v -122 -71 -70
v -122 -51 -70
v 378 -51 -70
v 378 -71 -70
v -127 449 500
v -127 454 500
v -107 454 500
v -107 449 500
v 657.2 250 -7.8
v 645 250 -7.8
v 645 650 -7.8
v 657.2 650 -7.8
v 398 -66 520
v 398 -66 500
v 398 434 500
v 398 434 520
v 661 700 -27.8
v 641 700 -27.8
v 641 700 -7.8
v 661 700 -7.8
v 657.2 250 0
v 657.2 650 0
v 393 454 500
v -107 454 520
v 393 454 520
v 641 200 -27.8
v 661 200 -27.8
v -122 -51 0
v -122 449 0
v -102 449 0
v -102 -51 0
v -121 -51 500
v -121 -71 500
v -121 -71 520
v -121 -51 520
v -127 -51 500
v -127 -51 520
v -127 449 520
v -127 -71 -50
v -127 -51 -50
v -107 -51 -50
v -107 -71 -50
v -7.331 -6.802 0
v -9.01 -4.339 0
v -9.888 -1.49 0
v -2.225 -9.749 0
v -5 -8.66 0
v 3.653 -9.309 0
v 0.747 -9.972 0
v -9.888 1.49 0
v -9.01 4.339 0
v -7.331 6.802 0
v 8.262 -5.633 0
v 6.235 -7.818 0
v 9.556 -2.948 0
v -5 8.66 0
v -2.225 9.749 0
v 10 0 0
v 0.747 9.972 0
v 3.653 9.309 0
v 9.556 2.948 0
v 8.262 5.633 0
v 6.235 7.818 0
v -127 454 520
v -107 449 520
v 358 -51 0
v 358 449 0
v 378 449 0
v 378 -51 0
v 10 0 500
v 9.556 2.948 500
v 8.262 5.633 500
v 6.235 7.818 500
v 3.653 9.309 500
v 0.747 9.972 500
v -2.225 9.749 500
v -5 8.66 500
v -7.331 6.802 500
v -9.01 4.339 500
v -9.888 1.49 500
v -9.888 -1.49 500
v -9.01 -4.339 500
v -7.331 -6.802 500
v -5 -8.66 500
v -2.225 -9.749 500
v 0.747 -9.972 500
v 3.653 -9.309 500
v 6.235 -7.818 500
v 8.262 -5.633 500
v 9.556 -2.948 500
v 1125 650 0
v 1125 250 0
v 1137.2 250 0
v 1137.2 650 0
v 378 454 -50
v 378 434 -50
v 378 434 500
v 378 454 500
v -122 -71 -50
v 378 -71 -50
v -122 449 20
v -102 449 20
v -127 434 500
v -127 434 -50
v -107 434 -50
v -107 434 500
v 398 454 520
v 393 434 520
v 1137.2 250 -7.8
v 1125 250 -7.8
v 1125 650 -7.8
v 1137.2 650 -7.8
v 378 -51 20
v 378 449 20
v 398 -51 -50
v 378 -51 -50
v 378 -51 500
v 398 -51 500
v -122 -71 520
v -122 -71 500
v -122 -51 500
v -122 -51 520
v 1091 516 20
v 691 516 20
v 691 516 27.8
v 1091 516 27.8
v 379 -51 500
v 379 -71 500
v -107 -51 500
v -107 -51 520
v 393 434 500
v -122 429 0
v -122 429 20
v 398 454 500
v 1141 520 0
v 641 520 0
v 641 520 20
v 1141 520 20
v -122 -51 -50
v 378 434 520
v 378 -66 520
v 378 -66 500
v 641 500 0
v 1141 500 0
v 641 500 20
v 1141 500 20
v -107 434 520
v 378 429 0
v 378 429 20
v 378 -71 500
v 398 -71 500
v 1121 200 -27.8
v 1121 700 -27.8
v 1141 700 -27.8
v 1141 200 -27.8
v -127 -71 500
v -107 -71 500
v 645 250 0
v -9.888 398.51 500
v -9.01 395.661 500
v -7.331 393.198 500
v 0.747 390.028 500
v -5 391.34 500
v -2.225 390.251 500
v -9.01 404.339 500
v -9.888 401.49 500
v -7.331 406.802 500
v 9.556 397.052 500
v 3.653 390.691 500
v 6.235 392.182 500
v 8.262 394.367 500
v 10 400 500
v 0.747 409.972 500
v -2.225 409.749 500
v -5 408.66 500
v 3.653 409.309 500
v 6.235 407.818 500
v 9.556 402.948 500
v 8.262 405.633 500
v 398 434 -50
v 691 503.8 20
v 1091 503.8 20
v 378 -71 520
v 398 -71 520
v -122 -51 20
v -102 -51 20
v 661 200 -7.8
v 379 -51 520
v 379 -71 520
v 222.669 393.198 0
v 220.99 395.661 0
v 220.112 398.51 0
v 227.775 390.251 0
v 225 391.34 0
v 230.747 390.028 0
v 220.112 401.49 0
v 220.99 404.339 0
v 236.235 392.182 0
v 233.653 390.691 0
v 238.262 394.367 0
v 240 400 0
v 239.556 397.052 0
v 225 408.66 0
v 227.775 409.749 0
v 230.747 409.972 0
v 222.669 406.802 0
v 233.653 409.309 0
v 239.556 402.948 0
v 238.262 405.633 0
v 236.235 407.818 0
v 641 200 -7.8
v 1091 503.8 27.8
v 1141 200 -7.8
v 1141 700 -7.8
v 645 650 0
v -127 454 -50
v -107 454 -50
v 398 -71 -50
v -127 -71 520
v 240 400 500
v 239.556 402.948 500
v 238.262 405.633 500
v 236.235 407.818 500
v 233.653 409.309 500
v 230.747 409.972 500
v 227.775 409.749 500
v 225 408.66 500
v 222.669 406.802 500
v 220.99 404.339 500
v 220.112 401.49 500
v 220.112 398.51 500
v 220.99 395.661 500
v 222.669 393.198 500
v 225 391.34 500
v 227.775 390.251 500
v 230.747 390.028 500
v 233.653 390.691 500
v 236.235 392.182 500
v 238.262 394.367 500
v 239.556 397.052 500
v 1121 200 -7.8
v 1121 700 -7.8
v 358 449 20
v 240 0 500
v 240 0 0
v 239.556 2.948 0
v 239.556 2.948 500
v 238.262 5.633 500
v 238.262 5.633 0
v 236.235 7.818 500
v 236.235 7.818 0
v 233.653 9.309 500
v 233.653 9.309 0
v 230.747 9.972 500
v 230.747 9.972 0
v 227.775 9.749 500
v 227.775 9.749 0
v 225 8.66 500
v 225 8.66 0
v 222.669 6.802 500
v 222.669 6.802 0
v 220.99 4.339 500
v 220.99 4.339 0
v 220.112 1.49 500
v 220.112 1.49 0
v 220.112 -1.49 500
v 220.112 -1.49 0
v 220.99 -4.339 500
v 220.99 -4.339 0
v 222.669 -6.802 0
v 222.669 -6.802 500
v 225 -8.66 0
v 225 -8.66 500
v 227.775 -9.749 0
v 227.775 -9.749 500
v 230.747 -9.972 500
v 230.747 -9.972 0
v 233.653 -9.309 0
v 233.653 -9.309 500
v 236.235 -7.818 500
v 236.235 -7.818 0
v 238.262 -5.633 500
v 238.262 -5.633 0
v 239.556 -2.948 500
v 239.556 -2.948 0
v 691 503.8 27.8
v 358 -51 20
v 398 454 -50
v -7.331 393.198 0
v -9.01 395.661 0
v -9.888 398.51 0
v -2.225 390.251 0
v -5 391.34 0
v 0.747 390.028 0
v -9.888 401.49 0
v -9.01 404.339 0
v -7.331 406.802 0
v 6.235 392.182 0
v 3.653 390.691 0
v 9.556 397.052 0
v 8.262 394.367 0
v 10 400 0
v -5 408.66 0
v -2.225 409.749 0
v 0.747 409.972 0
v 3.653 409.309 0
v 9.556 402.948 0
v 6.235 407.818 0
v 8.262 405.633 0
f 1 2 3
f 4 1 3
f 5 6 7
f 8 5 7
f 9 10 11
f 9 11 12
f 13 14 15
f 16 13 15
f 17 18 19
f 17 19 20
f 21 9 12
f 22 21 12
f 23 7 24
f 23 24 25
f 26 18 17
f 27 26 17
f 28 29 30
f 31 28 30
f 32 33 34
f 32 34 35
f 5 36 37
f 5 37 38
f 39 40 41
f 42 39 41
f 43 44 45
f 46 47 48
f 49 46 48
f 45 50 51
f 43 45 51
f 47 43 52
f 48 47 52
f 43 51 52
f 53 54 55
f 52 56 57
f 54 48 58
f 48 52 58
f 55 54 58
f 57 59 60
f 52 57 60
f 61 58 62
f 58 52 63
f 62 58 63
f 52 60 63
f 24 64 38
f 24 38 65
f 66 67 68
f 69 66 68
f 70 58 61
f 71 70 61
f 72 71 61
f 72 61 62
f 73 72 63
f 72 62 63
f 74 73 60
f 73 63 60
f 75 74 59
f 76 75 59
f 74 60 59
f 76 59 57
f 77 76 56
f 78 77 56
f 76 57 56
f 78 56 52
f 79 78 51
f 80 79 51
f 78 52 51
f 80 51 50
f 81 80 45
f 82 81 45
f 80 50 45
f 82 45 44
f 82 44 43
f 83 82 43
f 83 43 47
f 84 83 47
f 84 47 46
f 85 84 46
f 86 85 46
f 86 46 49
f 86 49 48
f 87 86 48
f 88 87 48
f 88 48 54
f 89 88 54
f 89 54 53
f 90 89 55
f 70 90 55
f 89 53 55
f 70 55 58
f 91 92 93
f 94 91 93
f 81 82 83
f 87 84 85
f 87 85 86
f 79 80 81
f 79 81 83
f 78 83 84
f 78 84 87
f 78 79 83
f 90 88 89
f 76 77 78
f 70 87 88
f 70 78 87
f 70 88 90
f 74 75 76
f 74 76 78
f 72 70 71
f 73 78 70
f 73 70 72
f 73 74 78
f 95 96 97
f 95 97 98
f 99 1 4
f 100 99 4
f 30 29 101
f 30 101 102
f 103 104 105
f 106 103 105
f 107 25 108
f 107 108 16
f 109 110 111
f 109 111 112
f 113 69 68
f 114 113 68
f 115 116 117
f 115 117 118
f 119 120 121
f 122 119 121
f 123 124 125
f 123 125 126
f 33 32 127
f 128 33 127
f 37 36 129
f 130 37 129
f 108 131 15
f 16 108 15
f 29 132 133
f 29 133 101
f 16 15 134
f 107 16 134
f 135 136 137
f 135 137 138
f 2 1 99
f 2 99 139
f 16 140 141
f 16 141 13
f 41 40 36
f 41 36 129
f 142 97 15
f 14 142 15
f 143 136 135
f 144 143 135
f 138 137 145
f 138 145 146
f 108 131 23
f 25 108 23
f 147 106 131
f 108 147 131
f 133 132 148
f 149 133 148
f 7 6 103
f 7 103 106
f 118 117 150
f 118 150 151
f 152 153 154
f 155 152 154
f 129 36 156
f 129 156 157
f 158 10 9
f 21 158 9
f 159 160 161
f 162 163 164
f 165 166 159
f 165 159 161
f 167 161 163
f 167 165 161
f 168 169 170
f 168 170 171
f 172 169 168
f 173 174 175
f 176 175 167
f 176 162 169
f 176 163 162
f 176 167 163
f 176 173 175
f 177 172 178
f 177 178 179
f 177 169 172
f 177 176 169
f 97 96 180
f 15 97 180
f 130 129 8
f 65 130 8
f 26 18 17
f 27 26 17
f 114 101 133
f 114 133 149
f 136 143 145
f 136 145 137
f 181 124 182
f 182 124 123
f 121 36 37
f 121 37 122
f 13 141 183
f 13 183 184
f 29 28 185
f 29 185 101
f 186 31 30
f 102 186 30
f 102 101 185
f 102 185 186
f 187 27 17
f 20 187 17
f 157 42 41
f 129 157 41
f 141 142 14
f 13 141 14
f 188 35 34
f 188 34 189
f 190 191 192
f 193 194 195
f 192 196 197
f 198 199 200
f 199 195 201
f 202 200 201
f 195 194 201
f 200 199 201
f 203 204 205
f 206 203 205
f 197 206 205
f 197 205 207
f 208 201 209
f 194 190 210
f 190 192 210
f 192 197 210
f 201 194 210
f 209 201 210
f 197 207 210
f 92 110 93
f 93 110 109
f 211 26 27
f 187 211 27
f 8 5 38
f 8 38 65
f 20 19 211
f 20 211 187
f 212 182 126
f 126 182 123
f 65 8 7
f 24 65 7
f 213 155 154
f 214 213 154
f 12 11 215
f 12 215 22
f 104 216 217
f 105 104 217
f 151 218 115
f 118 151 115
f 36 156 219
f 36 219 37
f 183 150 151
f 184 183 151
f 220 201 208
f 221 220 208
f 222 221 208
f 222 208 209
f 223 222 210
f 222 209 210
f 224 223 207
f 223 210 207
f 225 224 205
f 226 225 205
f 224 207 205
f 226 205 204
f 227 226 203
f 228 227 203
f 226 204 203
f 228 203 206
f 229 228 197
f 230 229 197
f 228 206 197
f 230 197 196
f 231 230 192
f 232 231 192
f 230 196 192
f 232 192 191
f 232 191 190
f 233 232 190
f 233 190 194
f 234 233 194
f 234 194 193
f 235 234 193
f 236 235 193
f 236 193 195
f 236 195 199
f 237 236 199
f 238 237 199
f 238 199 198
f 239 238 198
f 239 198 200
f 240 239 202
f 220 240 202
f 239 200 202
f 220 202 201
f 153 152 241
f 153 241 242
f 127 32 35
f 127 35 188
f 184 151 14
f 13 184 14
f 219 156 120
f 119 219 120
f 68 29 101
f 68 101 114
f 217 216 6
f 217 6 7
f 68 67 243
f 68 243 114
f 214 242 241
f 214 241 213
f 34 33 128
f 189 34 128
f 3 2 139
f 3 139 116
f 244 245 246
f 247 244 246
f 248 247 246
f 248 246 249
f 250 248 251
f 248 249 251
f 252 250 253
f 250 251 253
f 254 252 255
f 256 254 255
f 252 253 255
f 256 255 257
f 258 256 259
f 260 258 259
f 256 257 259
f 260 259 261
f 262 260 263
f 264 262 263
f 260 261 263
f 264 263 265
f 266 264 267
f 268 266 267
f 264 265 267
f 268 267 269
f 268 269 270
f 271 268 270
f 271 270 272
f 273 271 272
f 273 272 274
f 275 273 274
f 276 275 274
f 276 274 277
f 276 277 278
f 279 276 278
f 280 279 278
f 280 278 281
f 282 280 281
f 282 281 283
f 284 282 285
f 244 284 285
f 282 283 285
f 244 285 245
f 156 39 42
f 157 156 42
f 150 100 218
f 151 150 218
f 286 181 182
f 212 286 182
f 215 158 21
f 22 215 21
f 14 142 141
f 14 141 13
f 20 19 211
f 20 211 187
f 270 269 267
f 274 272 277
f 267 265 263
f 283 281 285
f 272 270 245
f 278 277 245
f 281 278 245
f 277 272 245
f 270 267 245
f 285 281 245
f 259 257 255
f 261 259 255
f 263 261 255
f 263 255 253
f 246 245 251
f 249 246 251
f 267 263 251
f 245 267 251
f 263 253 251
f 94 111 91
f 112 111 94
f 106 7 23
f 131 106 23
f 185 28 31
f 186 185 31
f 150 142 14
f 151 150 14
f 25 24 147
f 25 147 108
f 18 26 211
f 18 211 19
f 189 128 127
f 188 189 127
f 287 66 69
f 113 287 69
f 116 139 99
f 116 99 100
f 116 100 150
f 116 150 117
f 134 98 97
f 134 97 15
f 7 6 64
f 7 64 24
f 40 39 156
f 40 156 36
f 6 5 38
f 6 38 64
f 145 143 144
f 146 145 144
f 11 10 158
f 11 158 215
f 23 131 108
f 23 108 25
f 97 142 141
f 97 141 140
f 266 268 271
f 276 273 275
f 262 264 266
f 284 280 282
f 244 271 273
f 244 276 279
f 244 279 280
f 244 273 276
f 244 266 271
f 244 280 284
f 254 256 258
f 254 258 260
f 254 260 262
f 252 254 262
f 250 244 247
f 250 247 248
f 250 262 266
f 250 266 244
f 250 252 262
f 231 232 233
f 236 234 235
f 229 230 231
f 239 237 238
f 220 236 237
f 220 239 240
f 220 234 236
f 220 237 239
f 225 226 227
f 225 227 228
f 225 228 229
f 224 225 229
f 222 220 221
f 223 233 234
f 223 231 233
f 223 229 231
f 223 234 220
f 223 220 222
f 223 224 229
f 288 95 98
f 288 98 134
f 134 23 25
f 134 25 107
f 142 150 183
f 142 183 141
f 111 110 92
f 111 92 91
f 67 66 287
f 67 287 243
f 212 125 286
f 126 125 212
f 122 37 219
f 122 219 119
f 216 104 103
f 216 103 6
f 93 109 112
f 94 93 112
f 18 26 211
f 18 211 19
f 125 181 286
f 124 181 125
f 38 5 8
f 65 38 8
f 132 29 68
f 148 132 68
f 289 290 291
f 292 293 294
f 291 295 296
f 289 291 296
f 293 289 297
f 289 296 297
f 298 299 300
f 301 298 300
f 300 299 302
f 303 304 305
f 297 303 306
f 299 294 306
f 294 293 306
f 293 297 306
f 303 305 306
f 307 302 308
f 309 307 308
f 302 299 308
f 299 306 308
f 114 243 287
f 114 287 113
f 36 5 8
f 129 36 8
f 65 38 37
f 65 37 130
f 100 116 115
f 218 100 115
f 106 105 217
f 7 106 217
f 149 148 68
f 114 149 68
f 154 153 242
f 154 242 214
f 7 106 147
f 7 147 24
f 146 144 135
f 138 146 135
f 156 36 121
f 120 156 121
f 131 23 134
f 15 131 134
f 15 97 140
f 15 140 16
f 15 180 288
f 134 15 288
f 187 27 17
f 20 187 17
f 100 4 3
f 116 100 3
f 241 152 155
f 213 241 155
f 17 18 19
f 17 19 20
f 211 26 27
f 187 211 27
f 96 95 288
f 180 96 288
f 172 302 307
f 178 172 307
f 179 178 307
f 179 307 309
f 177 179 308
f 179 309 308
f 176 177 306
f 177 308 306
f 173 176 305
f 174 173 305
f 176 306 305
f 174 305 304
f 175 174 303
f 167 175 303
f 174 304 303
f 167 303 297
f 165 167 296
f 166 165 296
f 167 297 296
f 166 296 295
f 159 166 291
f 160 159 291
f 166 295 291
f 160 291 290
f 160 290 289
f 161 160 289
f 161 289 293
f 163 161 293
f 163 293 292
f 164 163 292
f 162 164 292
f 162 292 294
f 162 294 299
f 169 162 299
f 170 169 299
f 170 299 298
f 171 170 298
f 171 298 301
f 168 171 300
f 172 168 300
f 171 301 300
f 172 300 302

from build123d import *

# Parameters (mm, degrees)
CYLINDER_R        = 10
CYLINDER_DEPTH    = 500
CYLINDER001_R     = 10
CYLINDER001_DEPTH = 500
CYLINDER002_R     = 10
CYLINDER002_DEPTH = 500
CYLINDER003_R     = 10
CYLINDER003_DEPTH = 500
BOX_W             = 20
BOX_H             = 20
BOX_DEPTH         = 550
BOX001_W          = 500
BOX001_H          = 20
BOX001_DEPTH      = 20
BOX002_W          = 500
BOX002_H          = 20
BOX002_DEPTH      = 20
BOX003_W          = 20
BOX003_H          = 500
BOX003_DEPTH      = 20
BOX004_W          = 20
BOX004_H          = 500
BOX004_DEPTH      = 20
BOX005_W          = 20
BOX005_H          = 20
BOX005_DEPTH      = 550
BOX006_W          = 20
BOX006_H          = 20
BOX006_DEPTH      = 550
BOX007_W          = 20
BOX007_H          = 20
BOX007_DEPTH      = 550
BOX008_W          = 500
BOX008_H          = 20
BOX008_DEPTH      = 20
BOX009_W          = 500
BOX009_H          = 20
BOX009_DEPTH      = 20
BOX010_W          = 20
BOX010_H          = 500
BOX010_DEPTH      = 20
BOX011_W          = 20
BOX011_H          = 5
BOX011_DEPTH      = 20
BOX012_W          = 20
BOX012_H          = 500
BOX012_DEPTH      = 20
BOX013_W          = 20
BOX013_H          = 5
BOX013_DEPTH      = 20
BOX014_W          = 5
BOX014_H          = 20
BOX014_DEPTH      = 20
BOX015_W          = 5
BOX015_H          = 20
BOX015_DEPTH      = 20
BOX016_W          = 20
BOX016_H          = 500
BOX016_DEPTH      = 20
BOX017_W          = 20
BOX017_H          = 500
BOX017_DEPTH      = 20
BOX018_W          = 500
BOX018_H          = 20
BOX018_DEPTH      = 20
BOX019_W          = 400
BOX019_H          = 12.2
BOX019_DEPTH      = 7.8
BOX020_W          = 12.2
BOX020_H          = 400
BOX020_DEPTH      = 7.8
BOX021_W          = 12.2
BOX021_H          = 400
BOX021_DEPTH      = 7.8
BOX022_W          = 20
BOX022_H          = 500
BOX022_DEPTH      = 20


with BuildPart() as eixo_guia_frontal_direita:
    # Cylinder → Cylinder (new body)
    with BuildSketch(Plane(origin=(230, 0, 0), x_dir=(1, 0, 0), z_dir=(0, 0, 1))):
        Circle(CYLINDER_R)
    extrude(amount=CYLINDER_DEPTH)


with BuildPart() as eixo_guia_traseiro_direito:
    # Cylinder001 → Cylinder001 (new body)
    with BuildSketch(Plane(origin=(230, 400, 0), x_dir=(1, 0, 0), z_dir=(0, 0, 1))):
        Circle(CYLINDER001_R)
    extrude(amount=CYLINDER001_DEPTH)


with BuildPart() as eixo_guia_traseiro_esquerdo:
    # Cylinder002 → Cylinder002 (new body)
    with BuildSketch(Plane(origin=(0, 400, 0), x_dir=(1, 0, 0), z_dir=(0, 0, 1))):
        Circle(CYLINDER002_R)
    extrude(amount=CYLINDER002_DEPTH)


with BuildPart() as eixo_guia_frontal_esquerdo:
    # Cylinder003 → Cylinder003 (new body)
    with BuildSketch(Plane.XY):
        Circle(CYLINDER003_R)
    extrude(amount=CYLINDER003_DEPTH)


with BuildPart() as vslot_base_frontal_esquerda:
    # Box → Box (new body)
    with BuildSketch(Plane(origin=(-127, -71, -50), x_dir=(1, 0, 0), z_dir=(0, 0, 1))):
        with Locations((10, 10)):
            Rectangle(BOX_W, BOX_H)
    extrude(amount=BOX_DEPTH)


with BuildPart() as vslot_base_inferior_frontal:
    # Box001 → Box001 (new body)
    with BuildSketch(Plane(origin=(-122, -71, -70), x_dir=(1, 0, 0), z_dir=(0, 0, 1))):
        with Locations((250, 10)):
            Rectangle(BOX001_W, BOX001_H)
    extrude(amount=BOX001_DEPTH)


with BuildPart() as vslot_base_inferior_traseira:
    # Box002 → Box002 (new body)
    with BuildSketch(Plane(origin=(-122, 429, 0), x_dir=(1, 0, 0), z_dir=(0, 0, 1))):
        with Locations((250, 10)):
            Rectangle(BOX002_W, BOX002_H)
    extrude(amount=BOX002_DEPTH)


with BuildPart() as vslot_base_inferior_esquerda:
    # Box003 → Box003 (new body)
    with BuildSketch(Plane(origin=(-122, -51, 0), x_dir=(1, 0, 0), z_dir=(0, 0, 1))):
        with Locations((10, 250)):
            Rectangle(BOX003_W, BOX003_H)
    extrude(amount=BOX003_DEPTH)


with BuildPart() as vslot_base_inferior_direita:
    # Box004 → Box004 (new body)
    with BuildSketch(Plane(origin=(358, -51, 0), x_dir=(1, 0, 0), z_dir=(0, 0, 1))):
        with Locations((10, 250)):
            Rectangle(BOX004_W, BOX004_H)
    extrude(amount=BOX004_DEPTH)


with BuildPart() as vslot_base_frontal_direita:
    # Box005 → Box005 (new body)
    with BuildSketch(Plane(origin=(378, -71, -50), x_dir=(1, 0, 0), z_dir=(0, 0, 1))):
        with Locations((10, 10)):
            Rectangle(BOX005_W, BOX005_H)
    extrude(amount=BOX005_DEPTH)


with BuildPart() as vslot_base_traseira_direita:
    # Box006 → Box006 (new body)
    with BuildSketch(Plane(origin=(378, 434, -50), x_dir=(1, 0, 0), z_dir=(0, 0, 1))):
        with Locations((10, 10)):
            Rectangle(BOX006_W, BOX006_H)
    extrude(amount=BOX006_DEPTH)


with BuildPart() as vslot_base_traseira_esquerda:
    # Box007 → Box007 (new body)
    with BuildSketch(Plane(origin=(-127, 434, -50), x_dir=(1, 0, 0), z_dir=(0, 0, 1))):
        with Locations((10, 10)):
            Rectangle(BOX007_W, BOX007_H)
    extrude(amount=BOX007_DEPTH)


with BuildPart() as vslot_base_superior_frontal:
    # Box008 → Box008 (new body)
    with BuildSketch(Plane(origin=(-121, -71, 500), x_dir=(1, 0, 0), z_dir=(0, 0, 1))):
        with Locations((250, 10)):
            Rectangle(BOX008_W, BOX008_H)
    extrude(amount=BOX008_DEPTH)


with BuildPart() as vslot_base_superior_traseira:
    # Box009 → Box009 (new body)
    with BuildSketch(Plane(origin=(-107, 434, 500), x_dir=(1, 0, 0), z_dir=(0, 0, 1))):
        with Locations((250, 10)):
            Rectangle(BOX009_W, BOX009_H)
    extrude(amount=BOX009_DEPTH)


with BuildPart() as vslot_base_superior_direita:
    # Box010 → Box010 (new body)
    with BuildSketch(Plane(origin=(378, -66, 500), x_dir=(1, 0, 0), z_dir=(0, 0, 1))):
        with Locations((10, 250)):
            Rectangle(BOX010_W, BOX010_H)
    extrude(amount=BOX010_DEPTH)


with BuildPart() as cantoneira001:
    # Box011 → Box011 (new body)
    with BuildSketch(Plane(origin=(-127, 449, 500), x_dir=(1, 0, 0), z_dir=(0, 0, 1))):
        with Locations((10, 2.5)):
            Rectangle(BOX011_W, BOX011_H)
    extrude(amount=BOX011_DEPTH)


with BuildPart() as vslot_base_superior_esquerda:
    # Box012 → Box012 (new body)
    with BuildSketch(Plane(origin=(-127, -51, 500), x_dir=(1, 0, 0), z_dir=(0, 0, 1))):
        with Locations((10, 250)):
            Rectangle(BOX012_W, BOX012_H)
    extrude(amount=BOX012_DEPTH)


with BuildPart() as cantoneira004:
    # Box013 → Box013 (new body)
    with BuildSketch(Plane(origin=(378, -71, 500), x_dir=(1, 0, 0), z_dir=(0, 0, 1))):
        with Locations((10, 2.5)):
            Rectangle(BOX013_W, BOX013_H)
    extrude(amount=BOX013_DEPTH)


with BuildPart() as cantoneira002:
    # Box014 → Box014 (new body)
    with BuildSketch(Plane(origin=(393, 434, 500), x_dir=(1, 0, 0), z_dir=(0, 0, 1))):
        with Locations((2.5, 10)):
            Rectangle(BOX014_W, BOX014_H)
    extrude(amount=BOX014_DEPTH)


with BuildPart() as cantoneira003:
    # Box015 → Box015 (new body)
    with BuildSketch(Plane(origin=(-127, -71, 500), x_dir=(1, 0, 0), z_dir=(0, 0, 1))):
        with Locations((2.5, 10)):
            Rectangle(BOX015_W, BOX015_H)
    extrude(amount=BOX015_DEPTH)


with BuildPart() as vslot_y_esquerdo:
    # Box016 → Box016 (new body)
    with BuildSketch(Plane(origin=(641, 200, -27.8), x_dir=(1, 0, 0), z_dir=(0, 0, 1))):
        with Locations((10, 250)):
            Rectangle(BOX016_W, BOX016_H)
    extrude(amount=BOX016_DEPTH)


with BuildPart() as vslot_y_direito:
    # Box017 → Box017 (new body)
    with BuildSketch(Plane(origin=(1121, 200, -27.8), x_dir=(1, 0, 0), z_dir=(0, 0, 1))):
        with Locations((10, 250)):
            Rectangle(BOX017_W, BOX017_H)
    extrude(amount=BOX017_DEPTH)


with BuildPart() as vslot_x:
    # Box018 → Box018 (new body)
    with BuildSketch(Plane(origin=(641, 500, 0), x_dir=(1, 0, 0), z_dir=(0, 0, 1))):
        with Locations((250, 10)):
            Rectangle(BOX018_W, BOX018_H)
    extrude(amount=BOX018_DEPTH)


with BuildPart() as rail_x_superior:
    # Box019 → Box019 (new body)
    with BuildSketch(Plane(origin=(691, 503.8, 20), x_dir=(1, 0, 0), z_dir=(0, 0, 1))):
        with Locations((200, 6.1)):
            Rectangle(BOX019_W, BOX019_H)
    extrude(amount=BOX019_DEPTH)


with BuildPart() as rail_y_esquerdo:
    # Box020 → Box020 (new body)
    with BuildSketch(Plane(origin=(645, 250, -7.8), x_dir=(1, 0, 0), z_dir=(0, 0, 1))):
        with Locations((6.1, 200)):
            Rectangle(BOX020_W, BOX020_H)
    extrude(amount=BOX020_DEPTH)


with BuildPart() as rail_y_direito:
    # Box021 → Box021 (new body)
    with BuildSketch(Plane(origin=(1125, 250, -7.8), x_dir=(1, 0, 0), z_dir=(0, 0, 1))):
        with Locations((6.1, 200)):
            Rectangle(BOX021_W, BOX021_H)
    extrude(amount=BOX021_DEPTH)


with BuildPart() as vslot_y_esquerdo001:
    # Box022 → Box022 (new body)
    with BuildSketch(Plane(origin=(641, 200, -27.8), x_dir=(1, 0, 0), z_dir=(0, 0, 1))):
        with Locations((10, 250)):
            Rectangle(BOX022_W, BOX022_H)
    extrude(amount=BOX022_DEPTH)


solid = Compound([eixo_guia_frontal_direita.part, eixo_guia_traseiro_direito.part, eixo_guia_traseiro_esquerdo.part, eixo_guia_frontal_esquerdo.part, vslot_base_frontal_esquerda.part, vslot_base_inferior_frontal.part, vslot_base_inferior_traseira.part, vslot_base_inferior_esquerda.part, vslot_base_inferior_direita.part, vslot_base_frontal_direita.part, vslot_base_traseira_direita.part, vslot_base_traseira_esquerda.part, vslot_base_superior_frontal.part, vslot_base_superior_traseira.part, vslot_base_superior_direita.part, cantoneira001.part, vslot_base_superior_esquerda.part, cantoneira004.part, cantoneira002.part, cantoneira003.part, vslot_y_esquerdo.part, vslot_y_direito.part, vslot_x.part, rail_x_superior.part, rail_y_esquerdo.part, rail_y_direito.part, vslot_y_esquerdo001.part])
